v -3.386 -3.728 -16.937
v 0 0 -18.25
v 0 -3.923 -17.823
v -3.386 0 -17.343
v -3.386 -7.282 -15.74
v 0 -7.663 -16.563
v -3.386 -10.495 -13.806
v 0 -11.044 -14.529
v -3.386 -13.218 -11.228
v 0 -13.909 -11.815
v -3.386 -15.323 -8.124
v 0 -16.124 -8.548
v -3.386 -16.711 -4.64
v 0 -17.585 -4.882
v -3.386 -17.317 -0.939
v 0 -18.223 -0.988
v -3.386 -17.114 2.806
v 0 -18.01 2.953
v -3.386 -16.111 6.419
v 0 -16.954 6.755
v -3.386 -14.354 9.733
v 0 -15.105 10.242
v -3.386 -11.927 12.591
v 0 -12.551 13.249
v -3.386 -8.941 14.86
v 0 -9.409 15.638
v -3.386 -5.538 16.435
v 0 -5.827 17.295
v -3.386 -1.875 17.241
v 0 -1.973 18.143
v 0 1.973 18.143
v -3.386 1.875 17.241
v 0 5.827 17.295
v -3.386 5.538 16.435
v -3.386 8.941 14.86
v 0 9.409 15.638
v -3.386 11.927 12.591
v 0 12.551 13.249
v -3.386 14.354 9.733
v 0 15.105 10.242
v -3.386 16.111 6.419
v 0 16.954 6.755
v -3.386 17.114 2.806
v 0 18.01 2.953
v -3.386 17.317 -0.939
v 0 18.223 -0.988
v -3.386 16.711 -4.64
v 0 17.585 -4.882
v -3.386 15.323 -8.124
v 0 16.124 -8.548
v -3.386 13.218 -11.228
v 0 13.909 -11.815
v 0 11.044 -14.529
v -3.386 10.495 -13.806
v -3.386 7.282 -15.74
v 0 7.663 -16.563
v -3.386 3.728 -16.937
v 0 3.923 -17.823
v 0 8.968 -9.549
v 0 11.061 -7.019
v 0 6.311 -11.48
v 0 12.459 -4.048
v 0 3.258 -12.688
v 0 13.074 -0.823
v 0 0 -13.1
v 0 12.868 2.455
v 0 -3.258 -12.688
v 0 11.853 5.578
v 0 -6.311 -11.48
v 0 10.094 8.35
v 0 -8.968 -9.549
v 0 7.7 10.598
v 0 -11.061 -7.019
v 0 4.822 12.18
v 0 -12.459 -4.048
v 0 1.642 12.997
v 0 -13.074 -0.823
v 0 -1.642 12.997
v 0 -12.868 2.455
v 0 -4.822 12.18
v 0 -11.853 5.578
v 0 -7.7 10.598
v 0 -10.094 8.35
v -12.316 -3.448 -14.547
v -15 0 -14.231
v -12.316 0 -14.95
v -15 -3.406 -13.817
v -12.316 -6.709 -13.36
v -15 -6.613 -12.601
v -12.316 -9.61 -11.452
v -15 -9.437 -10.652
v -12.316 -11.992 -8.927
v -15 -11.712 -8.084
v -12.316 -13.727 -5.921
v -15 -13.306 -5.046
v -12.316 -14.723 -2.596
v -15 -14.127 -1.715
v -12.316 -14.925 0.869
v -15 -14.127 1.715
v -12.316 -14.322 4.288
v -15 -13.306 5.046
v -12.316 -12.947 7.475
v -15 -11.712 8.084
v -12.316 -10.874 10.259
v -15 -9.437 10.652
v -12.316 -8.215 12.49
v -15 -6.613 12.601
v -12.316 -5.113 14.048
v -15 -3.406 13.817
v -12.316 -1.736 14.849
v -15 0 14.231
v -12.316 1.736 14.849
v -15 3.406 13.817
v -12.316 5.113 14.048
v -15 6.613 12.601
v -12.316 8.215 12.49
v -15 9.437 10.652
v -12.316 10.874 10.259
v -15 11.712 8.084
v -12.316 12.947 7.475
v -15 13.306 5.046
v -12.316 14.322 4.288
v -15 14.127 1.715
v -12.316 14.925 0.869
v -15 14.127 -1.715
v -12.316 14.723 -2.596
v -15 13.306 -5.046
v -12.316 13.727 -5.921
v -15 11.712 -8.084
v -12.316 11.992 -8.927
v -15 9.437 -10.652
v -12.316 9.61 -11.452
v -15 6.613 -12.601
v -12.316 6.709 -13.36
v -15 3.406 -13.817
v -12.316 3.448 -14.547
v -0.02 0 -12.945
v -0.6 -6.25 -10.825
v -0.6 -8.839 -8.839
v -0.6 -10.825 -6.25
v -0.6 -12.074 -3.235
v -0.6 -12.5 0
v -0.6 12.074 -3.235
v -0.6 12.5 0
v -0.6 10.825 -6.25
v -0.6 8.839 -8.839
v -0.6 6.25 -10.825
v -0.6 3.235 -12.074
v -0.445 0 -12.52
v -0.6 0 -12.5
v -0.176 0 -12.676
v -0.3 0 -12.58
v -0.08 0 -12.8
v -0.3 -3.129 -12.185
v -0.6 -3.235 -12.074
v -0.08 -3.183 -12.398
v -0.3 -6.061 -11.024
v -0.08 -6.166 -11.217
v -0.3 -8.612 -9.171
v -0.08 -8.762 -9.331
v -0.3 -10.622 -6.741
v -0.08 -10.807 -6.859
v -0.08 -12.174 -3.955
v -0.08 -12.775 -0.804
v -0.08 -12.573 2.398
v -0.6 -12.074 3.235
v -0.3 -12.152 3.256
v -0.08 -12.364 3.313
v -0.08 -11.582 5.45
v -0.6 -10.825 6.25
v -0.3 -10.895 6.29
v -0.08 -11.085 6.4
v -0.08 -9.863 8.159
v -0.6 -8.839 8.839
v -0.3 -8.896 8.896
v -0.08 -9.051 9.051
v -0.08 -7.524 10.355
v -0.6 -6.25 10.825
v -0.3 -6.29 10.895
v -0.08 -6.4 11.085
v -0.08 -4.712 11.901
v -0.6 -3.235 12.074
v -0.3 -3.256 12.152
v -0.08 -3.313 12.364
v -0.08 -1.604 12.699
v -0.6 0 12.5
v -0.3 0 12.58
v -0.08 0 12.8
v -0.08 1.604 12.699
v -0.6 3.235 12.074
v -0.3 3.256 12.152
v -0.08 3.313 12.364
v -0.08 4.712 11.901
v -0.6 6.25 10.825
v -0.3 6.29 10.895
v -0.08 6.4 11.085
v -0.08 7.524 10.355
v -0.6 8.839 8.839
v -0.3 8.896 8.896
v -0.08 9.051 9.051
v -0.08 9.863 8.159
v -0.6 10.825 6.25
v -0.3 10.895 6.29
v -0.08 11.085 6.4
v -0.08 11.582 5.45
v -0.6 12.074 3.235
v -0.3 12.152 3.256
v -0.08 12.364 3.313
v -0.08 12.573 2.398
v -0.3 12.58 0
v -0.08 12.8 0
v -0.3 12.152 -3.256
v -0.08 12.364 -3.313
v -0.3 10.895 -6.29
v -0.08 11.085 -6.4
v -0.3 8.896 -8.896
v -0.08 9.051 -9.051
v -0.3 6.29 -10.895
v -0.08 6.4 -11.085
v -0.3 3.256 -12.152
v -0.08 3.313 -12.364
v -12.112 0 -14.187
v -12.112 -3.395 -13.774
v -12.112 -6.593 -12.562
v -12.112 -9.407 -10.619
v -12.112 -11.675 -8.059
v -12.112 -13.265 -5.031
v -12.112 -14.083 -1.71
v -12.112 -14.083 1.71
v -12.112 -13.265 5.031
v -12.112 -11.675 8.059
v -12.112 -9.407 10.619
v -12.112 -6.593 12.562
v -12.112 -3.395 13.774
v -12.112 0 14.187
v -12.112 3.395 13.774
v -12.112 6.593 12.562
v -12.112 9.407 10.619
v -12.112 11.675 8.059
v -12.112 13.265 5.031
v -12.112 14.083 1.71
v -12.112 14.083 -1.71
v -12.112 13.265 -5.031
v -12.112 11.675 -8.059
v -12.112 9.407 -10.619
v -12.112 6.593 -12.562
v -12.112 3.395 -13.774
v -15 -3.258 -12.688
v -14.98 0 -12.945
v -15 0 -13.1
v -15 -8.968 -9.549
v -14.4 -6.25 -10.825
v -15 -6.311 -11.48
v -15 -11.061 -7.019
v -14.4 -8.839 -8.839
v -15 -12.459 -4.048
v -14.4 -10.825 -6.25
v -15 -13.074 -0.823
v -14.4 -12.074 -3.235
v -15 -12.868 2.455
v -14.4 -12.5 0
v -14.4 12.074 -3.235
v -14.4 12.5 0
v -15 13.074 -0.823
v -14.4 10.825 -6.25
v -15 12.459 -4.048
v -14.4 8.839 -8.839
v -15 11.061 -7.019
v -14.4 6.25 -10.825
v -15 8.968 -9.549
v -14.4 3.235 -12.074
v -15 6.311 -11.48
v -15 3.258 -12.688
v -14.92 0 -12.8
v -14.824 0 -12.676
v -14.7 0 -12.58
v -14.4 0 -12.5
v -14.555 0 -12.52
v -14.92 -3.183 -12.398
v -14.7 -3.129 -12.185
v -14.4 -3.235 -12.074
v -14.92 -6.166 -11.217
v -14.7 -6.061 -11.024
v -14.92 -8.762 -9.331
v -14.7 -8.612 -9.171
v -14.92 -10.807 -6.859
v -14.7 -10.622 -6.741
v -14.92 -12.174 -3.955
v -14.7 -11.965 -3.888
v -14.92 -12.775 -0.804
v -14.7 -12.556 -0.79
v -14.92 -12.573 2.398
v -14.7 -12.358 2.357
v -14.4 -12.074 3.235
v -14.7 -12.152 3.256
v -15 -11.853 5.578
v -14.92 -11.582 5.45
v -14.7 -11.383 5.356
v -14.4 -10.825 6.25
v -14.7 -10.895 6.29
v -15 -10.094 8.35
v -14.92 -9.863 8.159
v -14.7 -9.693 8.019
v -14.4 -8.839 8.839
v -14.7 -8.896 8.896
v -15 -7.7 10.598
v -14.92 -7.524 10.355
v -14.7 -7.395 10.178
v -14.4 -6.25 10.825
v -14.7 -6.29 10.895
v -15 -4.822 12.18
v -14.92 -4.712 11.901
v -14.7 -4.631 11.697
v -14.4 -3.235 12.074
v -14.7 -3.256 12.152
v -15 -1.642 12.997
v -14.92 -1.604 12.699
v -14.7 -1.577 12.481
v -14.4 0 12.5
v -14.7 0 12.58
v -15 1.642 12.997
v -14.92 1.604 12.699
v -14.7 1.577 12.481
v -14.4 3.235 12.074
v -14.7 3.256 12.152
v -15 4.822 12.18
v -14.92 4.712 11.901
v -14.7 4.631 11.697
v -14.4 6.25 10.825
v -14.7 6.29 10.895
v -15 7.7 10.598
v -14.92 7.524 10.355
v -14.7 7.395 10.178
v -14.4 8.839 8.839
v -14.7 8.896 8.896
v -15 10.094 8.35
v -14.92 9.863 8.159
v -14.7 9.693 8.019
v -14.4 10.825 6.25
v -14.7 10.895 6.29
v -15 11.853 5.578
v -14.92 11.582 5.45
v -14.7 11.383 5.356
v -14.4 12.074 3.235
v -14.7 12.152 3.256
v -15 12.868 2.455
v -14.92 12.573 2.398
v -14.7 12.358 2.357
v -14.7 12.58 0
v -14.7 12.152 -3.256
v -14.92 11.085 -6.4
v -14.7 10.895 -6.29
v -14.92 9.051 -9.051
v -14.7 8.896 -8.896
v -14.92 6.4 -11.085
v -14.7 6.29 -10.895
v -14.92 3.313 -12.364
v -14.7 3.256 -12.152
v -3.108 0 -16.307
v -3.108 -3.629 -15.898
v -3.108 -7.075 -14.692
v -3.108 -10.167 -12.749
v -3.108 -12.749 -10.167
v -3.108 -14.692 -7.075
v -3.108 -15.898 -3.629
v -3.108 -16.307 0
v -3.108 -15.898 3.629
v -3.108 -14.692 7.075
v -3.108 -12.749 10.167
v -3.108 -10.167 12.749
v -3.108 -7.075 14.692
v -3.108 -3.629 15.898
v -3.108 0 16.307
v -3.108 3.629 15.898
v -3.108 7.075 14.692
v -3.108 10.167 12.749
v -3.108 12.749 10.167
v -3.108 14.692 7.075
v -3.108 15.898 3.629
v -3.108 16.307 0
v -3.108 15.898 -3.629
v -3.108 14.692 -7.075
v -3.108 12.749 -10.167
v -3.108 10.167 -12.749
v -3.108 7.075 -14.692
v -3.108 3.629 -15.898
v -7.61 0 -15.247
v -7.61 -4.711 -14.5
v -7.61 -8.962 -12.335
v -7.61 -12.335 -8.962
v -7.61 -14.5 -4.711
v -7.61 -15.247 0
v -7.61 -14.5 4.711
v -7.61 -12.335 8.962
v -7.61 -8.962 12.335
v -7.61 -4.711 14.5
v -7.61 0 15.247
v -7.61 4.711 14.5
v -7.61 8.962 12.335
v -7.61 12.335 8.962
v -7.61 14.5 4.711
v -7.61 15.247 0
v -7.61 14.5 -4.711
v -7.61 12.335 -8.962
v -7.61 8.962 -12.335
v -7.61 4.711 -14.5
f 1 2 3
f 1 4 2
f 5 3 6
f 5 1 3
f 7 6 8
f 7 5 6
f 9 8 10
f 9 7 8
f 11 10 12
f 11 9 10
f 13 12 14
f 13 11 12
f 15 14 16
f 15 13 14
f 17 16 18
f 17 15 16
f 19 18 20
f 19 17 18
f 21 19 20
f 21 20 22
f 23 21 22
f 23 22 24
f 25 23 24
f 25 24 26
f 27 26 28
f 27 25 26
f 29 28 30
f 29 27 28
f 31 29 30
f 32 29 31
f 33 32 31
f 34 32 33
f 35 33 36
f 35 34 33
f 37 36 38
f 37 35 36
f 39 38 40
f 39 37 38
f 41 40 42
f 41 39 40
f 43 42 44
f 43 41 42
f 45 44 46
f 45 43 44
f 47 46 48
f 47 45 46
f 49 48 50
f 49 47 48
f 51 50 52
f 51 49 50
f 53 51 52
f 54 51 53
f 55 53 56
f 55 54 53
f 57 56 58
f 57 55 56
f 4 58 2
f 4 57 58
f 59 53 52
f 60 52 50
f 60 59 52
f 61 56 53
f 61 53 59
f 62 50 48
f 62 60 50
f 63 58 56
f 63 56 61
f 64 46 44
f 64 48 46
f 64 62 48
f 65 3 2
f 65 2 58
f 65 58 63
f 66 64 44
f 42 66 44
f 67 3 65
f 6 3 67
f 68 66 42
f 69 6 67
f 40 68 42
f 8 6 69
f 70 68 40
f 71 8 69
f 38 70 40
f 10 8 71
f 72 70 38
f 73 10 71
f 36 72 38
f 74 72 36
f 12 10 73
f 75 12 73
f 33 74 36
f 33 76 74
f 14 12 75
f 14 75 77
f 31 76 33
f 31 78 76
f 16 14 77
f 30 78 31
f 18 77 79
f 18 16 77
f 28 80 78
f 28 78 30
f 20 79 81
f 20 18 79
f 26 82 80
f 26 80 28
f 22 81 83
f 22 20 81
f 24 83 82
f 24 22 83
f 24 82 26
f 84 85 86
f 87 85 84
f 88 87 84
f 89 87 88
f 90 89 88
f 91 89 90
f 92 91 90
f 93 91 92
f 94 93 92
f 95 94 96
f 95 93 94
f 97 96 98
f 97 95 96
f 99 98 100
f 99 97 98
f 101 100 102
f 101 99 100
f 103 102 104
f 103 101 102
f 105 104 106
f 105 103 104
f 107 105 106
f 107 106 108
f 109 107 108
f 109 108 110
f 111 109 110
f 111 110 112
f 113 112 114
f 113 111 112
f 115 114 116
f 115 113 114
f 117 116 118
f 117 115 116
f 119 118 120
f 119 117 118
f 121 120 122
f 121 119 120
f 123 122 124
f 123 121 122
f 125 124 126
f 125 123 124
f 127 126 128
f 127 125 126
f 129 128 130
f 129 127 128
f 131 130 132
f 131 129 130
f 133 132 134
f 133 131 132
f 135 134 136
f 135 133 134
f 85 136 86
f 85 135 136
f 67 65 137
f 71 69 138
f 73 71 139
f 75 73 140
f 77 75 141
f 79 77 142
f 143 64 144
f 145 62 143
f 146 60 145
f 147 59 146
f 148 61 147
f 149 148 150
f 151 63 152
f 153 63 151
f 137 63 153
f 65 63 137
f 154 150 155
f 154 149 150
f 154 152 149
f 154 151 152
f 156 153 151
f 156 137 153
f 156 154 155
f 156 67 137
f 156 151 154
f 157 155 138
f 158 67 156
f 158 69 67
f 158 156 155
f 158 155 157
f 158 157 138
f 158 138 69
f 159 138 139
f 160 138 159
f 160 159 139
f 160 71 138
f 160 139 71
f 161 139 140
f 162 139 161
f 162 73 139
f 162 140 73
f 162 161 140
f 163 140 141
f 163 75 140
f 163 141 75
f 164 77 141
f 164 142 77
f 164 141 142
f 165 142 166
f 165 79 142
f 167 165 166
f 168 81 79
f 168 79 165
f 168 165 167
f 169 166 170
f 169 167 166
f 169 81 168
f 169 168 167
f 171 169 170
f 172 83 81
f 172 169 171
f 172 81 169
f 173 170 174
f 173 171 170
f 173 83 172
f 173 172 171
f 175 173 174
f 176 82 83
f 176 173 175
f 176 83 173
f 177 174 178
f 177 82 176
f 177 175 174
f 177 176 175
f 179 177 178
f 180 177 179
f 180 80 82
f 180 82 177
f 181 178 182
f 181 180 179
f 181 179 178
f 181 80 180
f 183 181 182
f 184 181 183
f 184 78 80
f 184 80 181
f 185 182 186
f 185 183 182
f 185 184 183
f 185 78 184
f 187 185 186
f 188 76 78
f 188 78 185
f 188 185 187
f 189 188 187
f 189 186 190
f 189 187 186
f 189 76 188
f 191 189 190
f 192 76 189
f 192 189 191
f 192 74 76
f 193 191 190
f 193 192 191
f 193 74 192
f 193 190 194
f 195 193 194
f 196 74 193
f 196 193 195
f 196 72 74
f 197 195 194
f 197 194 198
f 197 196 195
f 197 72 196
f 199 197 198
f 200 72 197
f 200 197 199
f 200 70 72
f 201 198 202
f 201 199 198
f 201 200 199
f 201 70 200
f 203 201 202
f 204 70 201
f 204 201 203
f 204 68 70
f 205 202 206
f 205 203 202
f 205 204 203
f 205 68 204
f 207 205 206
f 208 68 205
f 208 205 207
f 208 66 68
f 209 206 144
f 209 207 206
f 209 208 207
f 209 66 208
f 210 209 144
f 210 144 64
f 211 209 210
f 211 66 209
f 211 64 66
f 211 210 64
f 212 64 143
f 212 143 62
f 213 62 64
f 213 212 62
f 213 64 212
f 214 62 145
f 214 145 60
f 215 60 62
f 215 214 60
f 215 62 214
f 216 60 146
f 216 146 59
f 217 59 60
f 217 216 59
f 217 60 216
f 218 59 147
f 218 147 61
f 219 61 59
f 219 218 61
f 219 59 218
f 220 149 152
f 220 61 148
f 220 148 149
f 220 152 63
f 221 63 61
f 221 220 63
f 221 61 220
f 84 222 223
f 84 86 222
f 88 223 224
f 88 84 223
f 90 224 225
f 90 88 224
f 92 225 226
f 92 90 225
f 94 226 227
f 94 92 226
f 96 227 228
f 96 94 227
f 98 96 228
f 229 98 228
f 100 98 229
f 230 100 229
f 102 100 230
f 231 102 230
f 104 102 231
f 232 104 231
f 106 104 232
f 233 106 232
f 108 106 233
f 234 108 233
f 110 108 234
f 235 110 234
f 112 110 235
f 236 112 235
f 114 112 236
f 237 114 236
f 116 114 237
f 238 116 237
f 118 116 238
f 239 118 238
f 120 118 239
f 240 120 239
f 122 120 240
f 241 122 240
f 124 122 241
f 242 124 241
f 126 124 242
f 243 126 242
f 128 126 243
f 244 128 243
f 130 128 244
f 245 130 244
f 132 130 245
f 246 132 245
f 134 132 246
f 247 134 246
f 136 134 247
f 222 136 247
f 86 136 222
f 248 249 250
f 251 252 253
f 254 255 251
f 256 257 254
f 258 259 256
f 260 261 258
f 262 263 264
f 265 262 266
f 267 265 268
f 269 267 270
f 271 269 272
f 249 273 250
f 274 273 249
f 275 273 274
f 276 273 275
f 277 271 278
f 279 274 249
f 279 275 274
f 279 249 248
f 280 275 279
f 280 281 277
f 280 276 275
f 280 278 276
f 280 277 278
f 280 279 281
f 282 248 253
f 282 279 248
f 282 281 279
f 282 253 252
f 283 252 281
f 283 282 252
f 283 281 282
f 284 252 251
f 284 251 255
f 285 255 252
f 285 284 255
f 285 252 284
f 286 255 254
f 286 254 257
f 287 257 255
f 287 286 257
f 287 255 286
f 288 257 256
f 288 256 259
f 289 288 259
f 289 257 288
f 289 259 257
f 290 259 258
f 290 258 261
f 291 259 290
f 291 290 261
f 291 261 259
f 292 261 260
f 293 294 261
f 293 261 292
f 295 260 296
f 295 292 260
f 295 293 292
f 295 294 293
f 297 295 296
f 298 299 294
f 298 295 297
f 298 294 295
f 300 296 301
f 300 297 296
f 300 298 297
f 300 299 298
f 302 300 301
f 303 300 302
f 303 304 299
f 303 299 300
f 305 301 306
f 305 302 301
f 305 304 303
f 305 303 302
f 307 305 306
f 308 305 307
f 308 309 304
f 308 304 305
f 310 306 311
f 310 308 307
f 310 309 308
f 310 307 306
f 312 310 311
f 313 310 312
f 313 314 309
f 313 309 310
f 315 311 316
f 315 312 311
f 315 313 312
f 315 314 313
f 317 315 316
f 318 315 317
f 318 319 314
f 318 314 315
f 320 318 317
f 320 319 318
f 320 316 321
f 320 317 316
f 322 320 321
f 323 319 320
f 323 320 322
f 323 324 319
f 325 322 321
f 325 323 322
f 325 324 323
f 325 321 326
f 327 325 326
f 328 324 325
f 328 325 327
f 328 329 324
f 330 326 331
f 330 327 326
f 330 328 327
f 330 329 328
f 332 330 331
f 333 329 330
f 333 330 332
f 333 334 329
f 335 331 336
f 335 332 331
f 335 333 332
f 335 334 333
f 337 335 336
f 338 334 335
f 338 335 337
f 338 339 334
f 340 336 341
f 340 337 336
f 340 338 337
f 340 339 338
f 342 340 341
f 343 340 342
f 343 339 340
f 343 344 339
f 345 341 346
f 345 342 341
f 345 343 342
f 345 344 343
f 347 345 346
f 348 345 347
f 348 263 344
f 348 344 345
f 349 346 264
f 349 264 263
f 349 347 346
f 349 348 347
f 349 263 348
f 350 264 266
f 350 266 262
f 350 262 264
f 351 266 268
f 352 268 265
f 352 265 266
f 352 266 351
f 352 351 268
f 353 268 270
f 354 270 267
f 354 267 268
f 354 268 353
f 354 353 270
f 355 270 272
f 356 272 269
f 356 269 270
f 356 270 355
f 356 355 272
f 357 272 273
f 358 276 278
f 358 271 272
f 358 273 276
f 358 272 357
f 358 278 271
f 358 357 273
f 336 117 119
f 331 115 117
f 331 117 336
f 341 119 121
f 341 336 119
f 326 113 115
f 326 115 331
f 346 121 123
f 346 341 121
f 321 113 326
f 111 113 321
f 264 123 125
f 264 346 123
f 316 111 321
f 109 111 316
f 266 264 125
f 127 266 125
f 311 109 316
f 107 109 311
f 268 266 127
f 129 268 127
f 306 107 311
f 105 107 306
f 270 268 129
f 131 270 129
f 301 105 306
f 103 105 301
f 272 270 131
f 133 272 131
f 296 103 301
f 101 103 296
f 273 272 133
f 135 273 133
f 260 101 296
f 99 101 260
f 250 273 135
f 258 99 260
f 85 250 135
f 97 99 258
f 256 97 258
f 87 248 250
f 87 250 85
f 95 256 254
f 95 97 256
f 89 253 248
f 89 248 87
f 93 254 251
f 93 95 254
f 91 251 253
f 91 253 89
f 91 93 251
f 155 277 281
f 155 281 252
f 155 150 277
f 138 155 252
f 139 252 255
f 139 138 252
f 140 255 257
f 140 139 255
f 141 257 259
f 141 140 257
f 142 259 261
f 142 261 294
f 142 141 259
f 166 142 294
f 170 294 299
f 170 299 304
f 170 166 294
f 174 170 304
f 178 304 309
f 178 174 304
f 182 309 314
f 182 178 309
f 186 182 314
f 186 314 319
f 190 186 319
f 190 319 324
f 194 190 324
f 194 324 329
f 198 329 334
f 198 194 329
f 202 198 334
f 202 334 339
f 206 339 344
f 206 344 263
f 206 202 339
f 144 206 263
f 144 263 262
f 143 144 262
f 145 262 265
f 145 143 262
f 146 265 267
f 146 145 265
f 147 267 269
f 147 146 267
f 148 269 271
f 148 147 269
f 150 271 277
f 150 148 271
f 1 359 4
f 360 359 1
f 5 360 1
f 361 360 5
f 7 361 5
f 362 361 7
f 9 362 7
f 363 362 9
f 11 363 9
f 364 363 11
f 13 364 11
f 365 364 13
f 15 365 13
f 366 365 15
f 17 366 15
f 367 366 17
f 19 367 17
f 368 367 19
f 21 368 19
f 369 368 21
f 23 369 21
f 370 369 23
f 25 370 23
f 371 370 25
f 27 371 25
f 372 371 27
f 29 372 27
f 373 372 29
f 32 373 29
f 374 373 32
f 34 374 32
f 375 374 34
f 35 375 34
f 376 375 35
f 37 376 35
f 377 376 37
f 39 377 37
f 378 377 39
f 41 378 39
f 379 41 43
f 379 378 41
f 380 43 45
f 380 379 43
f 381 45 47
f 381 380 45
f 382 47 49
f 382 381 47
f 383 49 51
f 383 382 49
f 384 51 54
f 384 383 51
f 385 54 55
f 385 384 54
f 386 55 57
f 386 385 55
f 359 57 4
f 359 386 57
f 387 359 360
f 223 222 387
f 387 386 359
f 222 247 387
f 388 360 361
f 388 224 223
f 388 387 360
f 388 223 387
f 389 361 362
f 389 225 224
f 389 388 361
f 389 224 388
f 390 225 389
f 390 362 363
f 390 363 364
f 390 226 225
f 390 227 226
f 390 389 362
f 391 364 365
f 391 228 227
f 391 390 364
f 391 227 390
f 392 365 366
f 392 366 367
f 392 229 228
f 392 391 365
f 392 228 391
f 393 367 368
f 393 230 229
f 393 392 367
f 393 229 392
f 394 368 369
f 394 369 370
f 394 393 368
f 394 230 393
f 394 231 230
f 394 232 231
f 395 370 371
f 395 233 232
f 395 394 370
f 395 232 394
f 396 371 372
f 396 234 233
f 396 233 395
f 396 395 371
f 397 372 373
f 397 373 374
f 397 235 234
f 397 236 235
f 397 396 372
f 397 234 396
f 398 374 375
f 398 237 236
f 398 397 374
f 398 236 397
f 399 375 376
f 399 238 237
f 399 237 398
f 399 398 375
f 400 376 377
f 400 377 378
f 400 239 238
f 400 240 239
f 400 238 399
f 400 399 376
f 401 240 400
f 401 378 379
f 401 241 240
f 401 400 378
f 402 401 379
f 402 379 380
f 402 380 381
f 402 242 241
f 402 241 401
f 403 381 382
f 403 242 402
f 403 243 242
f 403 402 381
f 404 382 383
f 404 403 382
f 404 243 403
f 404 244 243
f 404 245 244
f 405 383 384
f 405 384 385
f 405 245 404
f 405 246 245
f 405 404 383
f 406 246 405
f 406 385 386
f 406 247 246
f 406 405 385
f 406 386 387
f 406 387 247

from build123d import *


with BuildPart() as part:
    # Esquisse1 → Base-Révolution (revolve)
    with BuildSketch(Plane.XY, mode=Mode.PRIVATE) as base_r_volution_sk:
        with BuildLine():
            Line((0, 13.1), (0, 18.25))
            Line((0, 18.25), (-3.385649604, 17.342817923))
            Line((-3.385649604, 17.342817923), (-3.108014609, 16.306670018))
            Line((-3.108014609, 16.306670018), (-12.11177275, 14.186566402))
            Line((-12.11177275, 14.186566402), (-12.316296218, 14.949858375))
            Line((-12.316296218, 14.949858375), (-15, 14.230762114))
            Line((-15, 14.230762114), (-15, 13.1))
            ThreePointArc((-15, 13.1), (-14.824264069, 12.675735931), (-14.4, 12.5))
            Line((-14.4, 12.5), (-0.6, 12.5))
            ThreePointArc((-0.6, 12.5), (-0.175735931, 12.675735931), (0, 13.1))
        make_face()
    revolve(base_r_volution_sk.sketch.rotate(Axis((0, 0, 0), (-1, 0, 0)), 90), axis=Axis((0, 0, 0), (-1, 0, 0)))


solid = part.part
